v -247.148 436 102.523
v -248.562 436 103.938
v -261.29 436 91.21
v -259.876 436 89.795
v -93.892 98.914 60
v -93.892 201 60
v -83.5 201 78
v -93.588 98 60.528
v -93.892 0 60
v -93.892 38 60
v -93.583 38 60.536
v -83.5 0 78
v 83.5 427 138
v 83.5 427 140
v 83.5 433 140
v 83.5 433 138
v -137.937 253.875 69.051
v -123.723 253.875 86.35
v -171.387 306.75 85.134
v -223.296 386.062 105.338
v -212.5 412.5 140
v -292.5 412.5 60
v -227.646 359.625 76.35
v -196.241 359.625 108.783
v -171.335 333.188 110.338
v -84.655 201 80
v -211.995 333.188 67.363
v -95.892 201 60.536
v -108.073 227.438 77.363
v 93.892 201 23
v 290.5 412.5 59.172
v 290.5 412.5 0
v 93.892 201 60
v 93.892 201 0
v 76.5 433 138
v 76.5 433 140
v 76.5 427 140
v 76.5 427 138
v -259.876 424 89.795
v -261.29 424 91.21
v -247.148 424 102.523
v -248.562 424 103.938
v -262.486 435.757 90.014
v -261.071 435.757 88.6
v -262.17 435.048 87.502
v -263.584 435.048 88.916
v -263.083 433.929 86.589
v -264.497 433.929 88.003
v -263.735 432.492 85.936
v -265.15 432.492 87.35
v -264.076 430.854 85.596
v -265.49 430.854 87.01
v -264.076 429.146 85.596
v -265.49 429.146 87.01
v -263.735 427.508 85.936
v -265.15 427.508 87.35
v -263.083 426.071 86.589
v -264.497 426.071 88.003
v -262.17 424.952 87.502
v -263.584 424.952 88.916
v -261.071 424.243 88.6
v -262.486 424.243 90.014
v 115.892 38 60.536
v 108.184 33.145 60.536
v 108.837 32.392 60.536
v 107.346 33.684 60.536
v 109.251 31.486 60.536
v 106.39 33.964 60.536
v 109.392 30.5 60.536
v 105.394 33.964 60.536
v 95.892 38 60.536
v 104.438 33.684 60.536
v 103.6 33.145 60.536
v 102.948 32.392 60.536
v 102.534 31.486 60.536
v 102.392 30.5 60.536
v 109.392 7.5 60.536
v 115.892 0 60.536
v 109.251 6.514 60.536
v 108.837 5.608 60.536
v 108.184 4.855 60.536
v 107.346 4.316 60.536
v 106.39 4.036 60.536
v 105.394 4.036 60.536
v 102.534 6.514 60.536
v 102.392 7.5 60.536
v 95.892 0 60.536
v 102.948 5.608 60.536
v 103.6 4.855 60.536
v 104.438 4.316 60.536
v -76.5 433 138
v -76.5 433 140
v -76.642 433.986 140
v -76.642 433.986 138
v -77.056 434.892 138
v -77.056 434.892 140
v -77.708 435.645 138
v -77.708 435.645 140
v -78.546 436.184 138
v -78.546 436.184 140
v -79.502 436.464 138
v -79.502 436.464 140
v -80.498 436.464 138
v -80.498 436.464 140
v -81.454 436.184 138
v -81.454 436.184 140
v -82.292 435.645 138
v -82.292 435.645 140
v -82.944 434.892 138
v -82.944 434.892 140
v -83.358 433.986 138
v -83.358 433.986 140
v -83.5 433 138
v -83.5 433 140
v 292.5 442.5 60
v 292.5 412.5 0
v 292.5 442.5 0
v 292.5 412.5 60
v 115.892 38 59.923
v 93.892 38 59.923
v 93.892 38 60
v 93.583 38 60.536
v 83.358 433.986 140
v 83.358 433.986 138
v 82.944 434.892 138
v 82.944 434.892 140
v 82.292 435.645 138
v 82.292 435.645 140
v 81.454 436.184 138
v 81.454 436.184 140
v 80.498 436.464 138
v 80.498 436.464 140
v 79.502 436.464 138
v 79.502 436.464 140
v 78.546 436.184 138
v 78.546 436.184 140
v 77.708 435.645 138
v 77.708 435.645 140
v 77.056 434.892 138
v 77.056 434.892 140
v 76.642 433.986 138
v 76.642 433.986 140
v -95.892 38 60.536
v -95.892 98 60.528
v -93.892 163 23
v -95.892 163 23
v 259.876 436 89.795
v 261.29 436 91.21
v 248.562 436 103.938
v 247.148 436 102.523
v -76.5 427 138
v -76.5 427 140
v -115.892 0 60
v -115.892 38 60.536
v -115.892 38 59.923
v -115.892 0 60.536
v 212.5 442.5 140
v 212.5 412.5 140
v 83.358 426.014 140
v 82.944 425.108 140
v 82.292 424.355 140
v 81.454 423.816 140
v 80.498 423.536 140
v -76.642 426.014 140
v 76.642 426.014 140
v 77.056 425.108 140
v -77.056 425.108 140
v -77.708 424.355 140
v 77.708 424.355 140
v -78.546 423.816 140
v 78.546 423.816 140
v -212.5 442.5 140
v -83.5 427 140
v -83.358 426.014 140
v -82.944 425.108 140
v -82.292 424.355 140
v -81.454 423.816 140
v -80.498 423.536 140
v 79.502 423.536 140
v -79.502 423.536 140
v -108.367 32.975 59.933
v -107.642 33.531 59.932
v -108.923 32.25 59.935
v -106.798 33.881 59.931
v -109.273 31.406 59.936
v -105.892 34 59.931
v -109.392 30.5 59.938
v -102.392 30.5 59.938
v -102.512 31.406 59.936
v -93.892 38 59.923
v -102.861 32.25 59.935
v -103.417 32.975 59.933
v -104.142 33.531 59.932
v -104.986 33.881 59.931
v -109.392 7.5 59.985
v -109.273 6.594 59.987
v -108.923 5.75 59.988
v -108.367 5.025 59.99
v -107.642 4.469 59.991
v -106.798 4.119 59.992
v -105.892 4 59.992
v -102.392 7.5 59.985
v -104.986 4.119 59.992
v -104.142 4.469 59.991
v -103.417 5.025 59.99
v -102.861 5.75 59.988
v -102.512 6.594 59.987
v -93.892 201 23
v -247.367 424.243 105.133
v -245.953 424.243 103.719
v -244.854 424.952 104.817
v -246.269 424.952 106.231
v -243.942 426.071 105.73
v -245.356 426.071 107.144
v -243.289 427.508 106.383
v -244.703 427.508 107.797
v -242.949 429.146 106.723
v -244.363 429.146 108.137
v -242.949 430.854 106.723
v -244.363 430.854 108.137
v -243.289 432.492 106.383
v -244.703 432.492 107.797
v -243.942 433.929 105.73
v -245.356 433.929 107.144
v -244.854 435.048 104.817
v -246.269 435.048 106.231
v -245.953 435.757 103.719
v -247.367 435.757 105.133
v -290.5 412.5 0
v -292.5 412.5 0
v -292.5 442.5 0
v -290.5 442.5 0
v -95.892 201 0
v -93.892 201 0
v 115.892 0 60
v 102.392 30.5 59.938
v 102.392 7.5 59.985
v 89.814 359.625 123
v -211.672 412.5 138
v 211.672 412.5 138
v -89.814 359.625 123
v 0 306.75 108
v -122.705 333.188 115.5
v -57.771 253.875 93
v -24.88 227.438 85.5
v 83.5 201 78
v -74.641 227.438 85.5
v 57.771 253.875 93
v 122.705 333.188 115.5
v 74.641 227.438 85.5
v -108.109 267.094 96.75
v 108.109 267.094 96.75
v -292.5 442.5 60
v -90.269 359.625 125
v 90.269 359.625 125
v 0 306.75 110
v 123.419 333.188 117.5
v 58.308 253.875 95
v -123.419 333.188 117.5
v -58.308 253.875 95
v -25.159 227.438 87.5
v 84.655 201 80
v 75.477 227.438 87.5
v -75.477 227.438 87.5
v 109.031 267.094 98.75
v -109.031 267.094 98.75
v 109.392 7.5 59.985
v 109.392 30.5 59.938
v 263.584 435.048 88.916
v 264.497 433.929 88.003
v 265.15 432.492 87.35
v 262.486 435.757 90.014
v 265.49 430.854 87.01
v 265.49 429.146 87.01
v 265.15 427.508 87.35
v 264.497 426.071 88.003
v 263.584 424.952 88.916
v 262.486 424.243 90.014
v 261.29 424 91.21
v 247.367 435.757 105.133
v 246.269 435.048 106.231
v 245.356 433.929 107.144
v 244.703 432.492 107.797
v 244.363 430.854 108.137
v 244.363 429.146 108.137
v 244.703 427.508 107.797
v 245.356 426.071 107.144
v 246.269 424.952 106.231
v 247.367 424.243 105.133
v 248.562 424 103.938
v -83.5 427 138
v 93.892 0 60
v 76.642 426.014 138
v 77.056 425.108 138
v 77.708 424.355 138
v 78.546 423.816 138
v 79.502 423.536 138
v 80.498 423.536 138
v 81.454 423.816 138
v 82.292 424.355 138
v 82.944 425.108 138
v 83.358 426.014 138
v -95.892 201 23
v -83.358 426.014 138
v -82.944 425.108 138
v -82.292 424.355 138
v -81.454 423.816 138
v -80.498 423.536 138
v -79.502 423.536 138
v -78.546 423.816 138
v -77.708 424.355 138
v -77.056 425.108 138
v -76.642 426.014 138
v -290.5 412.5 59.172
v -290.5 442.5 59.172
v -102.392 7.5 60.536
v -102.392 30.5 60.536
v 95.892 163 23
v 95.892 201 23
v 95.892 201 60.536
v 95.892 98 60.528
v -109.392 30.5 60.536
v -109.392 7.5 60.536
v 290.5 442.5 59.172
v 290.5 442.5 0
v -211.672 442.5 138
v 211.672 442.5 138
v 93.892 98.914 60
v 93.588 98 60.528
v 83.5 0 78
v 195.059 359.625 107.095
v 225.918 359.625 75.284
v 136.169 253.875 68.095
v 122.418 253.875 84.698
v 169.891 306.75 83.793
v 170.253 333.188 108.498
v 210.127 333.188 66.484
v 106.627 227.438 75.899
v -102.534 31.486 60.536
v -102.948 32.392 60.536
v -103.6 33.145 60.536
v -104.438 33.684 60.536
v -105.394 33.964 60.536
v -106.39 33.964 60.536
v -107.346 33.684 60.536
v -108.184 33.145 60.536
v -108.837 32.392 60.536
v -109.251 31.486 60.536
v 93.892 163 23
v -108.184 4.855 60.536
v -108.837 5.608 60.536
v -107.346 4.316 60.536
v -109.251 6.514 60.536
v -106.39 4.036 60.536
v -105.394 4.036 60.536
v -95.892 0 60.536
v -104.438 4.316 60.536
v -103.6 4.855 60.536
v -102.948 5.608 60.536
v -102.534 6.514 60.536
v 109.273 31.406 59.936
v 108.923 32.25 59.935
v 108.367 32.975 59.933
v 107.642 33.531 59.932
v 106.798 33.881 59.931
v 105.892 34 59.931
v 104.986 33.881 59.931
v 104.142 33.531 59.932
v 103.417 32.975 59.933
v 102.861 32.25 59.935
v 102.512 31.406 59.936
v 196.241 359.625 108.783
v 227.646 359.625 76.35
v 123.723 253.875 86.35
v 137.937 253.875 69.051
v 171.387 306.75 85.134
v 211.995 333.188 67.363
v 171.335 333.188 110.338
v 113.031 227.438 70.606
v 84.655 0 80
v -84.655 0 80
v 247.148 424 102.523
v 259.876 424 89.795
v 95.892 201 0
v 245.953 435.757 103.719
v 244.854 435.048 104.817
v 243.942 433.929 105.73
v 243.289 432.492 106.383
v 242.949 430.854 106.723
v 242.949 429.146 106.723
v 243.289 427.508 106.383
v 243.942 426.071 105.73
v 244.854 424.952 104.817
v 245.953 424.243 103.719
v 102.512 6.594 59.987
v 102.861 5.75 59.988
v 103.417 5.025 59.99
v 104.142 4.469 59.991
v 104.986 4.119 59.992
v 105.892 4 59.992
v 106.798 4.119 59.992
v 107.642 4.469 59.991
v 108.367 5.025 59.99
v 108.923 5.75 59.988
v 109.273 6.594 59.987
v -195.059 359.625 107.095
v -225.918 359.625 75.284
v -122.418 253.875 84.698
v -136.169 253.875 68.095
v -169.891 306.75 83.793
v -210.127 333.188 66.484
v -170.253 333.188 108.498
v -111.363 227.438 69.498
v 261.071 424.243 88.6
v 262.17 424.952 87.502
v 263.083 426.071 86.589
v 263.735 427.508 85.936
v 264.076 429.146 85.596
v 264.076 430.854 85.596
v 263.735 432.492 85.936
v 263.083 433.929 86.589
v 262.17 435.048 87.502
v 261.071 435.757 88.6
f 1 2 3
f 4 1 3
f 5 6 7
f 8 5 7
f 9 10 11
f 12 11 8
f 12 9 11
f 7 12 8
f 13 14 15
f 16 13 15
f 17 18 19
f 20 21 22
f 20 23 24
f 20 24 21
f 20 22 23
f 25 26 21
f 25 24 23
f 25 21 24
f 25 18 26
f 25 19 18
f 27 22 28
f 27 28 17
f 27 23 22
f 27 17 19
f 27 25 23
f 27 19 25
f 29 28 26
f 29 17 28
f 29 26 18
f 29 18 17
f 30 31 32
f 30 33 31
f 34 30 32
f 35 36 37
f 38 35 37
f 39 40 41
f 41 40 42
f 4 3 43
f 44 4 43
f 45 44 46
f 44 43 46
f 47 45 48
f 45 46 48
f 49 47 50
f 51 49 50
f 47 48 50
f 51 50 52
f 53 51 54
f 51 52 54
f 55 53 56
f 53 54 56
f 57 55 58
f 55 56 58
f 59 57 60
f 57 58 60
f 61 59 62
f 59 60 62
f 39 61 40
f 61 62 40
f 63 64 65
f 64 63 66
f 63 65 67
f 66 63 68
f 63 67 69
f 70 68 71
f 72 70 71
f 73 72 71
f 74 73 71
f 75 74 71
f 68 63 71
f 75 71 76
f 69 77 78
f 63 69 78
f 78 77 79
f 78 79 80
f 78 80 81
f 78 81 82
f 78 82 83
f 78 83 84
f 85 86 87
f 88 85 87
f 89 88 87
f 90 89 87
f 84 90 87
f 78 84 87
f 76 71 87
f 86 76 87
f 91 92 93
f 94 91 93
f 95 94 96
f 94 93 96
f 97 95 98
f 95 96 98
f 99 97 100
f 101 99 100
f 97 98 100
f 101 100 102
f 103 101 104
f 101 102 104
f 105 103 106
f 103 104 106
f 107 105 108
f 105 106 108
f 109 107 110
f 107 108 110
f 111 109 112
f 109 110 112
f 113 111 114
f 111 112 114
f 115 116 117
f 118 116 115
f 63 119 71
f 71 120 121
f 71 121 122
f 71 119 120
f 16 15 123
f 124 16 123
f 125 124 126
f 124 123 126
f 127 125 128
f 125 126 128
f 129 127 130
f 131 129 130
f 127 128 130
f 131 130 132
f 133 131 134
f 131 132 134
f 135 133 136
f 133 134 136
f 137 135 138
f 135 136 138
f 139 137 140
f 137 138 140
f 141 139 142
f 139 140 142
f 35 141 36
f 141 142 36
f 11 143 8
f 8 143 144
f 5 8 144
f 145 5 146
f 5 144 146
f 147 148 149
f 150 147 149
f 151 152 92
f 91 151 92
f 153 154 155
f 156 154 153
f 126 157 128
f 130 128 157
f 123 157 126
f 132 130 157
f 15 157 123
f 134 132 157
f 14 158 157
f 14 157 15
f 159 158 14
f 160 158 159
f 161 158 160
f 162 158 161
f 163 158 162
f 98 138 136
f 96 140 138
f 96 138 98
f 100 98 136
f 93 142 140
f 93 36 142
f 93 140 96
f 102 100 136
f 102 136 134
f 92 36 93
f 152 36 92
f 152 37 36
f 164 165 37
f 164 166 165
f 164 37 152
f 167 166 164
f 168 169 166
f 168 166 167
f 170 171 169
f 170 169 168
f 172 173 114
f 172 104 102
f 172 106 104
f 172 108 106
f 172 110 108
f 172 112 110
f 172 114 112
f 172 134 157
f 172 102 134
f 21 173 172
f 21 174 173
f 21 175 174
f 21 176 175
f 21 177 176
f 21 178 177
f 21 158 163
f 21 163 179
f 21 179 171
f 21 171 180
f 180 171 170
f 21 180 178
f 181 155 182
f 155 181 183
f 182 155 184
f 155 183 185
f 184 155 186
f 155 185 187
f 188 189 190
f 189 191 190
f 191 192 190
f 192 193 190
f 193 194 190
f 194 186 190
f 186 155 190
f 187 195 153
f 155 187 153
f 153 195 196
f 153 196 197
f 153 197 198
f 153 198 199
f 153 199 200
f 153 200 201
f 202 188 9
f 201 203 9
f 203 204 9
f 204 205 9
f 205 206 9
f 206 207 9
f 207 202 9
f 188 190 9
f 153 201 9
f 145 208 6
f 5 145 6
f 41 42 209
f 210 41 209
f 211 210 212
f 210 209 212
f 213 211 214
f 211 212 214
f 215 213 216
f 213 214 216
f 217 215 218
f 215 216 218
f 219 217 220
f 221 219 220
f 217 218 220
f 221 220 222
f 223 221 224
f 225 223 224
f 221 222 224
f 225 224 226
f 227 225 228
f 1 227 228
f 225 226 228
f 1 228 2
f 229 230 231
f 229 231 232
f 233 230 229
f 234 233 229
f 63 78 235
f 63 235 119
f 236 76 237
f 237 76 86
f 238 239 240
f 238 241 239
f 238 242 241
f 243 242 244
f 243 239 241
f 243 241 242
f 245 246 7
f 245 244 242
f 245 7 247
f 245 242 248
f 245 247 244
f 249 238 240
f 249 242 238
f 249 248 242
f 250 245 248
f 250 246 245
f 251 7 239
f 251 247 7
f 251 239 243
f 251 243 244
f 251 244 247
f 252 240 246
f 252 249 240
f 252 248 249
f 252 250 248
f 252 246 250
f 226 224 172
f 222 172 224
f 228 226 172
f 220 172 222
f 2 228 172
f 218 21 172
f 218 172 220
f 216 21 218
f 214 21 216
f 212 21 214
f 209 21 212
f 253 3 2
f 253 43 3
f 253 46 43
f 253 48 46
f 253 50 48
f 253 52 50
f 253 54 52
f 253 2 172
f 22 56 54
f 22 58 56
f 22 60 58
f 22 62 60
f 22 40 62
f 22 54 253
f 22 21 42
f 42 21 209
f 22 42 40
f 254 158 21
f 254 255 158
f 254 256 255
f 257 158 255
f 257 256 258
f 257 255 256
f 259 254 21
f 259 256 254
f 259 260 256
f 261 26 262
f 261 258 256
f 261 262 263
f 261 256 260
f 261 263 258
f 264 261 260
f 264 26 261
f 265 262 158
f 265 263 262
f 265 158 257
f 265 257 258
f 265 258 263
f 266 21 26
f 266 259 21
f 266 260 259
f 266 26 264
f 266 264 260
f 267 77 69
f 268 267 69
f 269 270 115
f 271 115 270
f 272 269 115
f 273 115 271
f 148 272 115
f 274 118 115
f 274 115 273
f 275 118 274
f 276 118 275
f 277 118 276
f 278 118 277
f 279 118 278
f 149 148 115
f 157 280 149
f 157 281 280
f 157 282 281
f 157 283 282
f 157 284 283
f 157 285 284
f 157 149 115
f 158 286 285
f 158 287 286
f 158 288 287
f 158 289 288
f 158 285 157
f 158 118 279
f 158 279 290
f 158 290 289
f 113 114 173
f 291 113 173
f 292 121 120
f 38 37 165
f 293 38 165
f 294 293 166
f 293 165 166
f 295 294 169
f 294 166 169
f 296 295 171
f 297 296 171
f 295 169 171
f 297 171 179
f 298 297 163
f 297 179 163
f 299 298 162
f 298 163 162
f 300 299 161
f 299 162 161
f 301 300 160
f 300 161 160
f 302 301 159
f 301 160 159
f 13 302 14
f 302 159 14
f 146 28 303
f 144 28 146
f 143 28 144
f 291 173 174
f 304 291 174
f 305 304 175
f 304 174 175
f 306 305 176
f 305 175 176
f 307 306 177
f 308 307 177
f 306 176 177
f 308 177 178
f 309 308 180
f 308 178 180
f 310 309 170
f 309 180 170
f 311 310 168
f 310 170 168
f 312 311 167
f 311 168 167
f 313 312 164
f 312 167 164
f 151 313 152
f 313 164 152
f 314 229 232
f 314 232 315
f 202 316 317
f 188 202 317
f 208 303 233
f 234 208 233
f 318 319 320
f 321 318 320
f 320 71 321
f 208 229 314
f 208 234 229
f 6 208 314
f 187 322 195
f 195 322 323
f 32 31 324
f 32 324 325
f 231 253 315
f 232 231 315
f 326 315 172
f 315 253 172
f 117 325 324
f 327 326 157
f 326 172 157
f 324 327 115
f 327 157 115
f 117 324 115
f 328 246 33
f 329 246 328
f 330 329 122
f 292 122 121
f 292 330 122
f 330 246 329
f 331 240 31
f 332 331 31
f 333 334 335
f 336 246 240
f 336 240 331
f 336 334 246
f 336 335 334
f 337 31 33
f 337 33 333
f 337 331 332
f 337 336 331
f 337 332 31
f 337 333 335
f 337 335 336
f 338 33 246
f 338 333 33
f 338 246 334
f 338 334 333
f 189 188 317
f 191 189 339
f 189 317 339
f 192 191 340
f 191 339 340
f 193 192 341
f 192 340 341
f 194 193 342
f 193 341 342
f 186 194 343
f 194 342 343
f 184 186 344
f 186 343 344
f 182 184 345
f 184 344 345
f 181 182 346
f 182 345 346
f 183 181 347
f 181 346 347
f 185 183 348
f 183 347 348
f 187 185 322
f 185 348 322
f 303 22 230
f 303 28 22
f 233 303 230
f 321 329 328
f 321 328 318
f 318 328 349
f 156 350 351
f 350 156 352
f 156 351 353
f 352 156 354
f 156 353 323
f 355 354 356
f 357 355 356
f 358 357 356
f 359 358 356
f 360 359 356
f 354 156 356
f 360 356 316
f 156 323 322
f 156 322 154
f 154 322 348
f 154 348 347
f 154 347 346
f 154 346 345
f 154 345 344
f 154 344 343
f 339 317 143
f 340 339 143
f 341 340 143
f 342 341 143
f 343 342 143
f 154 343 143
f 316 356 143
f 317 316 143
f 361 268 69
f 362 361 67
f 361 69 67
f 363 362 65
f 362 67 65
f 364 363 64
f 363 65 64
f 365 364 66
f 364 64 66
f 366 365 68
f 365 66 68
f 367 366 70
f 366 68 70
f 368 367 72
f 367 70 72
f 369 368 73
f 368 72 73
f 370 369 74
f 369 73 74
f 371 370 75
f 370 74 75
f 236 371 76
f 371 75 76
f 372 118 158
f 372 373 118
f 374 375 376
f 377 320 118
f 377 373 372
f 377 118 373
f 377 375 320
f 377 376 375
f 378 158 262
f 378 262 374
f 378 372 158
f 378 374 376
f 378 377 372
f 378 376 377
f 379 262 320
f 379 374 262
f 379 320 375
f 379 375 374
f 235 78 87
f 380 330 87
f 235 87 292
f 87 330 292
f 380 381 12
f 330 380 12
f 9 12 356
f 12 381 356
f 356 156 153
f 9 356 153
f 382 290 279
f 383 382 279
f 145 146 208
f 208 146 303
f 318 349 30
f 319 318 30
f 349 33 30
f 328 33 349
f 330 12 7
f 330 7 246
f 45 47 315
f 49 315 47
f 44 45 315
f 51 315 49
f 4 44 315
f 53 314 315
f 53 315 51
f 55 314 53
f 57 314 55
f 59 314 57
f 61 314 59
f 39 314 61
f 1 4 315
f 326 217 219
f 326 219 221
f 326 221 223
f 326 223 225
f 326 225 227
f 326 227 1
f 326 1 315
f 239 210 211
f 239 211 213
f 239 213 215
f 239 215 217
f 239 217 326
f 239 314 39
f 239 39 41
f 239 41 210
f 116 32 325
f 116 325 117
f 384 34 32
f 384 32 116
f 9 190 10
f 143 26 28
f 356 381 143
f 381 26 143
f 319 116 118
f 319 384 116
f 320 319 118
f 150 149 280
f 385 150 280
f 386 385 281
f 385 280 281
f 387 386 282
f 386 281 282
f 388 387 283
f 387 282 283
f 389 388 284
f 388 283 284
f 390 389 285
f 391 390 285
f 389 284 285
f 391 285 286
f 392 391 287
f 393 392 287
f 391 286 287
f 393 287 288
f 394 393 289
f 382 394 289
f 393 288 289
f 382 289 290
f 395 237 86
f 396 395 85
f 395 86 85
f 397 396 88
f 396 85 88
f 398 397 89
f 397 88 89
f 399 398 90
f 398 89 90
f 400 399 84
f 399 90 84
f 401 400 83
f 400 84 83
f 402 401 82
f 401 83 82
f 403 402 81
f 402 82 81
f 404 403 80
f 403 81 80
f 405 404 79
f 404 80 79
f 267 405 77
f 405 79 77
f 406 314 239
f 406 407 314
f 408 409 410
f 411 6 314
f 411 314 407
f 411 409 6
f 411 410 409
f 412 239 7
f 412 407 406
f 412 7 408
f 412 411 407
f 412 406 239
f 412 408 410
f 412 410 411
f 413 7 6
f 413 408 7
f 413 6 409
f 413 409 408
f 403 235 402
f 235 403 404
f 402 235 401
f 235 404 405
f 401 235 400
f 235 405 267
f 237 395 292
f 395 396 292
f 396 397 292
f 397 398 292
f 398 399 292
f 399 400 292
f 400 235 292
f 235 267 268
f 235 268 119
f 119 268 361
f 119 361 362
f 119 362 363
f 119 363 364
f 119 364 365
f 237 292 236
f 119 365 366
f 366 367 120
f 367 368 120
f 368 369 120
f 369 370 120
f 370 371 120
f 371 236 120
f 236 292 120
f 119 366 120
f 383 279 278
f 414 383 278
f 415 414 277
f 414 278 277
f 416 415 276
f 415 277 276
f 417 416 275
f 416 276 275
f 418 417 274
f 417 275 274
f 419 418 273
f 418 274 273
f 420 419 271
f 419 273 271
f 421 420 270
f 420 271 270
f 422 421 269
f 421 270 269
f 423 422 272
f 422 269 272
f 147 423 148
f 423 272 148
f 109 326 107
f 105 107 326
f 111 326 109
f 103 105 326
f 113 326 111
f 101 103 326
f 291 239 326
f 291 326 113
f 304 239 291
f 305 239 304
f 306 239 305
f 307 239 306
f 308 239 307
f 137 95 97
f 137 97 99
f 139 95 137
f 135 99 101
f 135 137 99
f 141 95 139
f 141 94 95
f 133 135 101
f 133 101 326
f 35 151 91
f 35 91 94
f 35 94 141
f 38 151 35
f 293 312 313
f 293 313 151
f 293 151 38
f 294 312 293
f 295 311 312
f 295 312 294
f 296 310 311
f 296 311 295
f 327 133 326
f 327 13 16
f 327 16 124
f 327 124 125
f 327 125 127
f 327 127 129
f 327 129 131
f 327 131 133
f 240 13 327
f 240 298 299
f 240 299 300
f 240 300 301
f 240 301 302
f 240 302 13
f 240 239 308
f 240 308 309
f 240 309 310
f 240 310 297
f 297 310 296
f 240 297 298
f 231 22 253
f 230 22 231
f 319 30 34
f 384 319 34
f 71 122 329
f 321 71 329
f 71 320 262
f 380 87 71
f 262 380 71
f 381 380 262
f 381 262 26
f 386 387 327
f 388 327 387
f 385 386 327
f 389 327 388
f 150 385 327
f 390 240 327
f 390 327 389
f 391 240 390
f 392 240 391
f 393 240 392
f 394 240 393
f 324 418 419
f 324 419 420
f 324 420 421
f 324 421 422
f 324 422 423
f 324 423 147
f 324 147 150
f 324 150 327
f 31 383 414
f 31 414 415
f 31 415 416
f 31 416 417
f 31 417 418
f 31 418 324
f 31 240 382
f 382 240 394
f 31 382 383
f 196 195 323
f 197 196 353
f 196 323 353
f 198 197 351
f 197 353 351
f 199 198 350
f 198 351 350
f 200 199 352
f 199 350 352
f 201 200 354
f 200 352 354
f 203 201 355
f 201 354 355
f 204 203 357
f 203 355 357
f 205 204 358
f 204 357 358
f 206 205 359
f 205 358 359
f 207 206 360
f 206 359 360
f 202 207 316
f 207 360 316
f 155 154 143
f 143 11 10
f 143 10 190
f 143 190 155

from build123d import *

# Parameters (mm, degrees)
F1_DEPTH  = 201
F4_DEPTH  = 30
F7_DEPTH  = 388.393305
F9_DEPTH  = 20
F11_DEPTH = 20
F13_DEPTH = 60.536898
F15_DEPTH = 60.536898
F17_DEPTH = 140.001
F19_DEPTH = 456.084874
F21_DEPTH = 456.084874


with BuildPart() as f1:
    # F0 (on Front) → F1 (new body)
    with BuildSketch(Plane.XZ):
        Polygon((-83.5, 78), (0, 78), (83.5, 78), (93.892305, 60), (93.892305, 0), (95.892305, 0), (95.892305, 60.535898), (84.654701, 80), (0, 80), (-84.654701, 80), (-95.892305, 60.535898), (-95.892305, 0), (-93.892305, 0), (-93.892305, 60), align=None)
    extrude(amount=-F1_DEPTH)



with BuildPart() as f4:
    # F3 (on offset) → F4 (new body)
    with BuildSketch(Plane.XZ.offset(-412.5)):
        Polygon((212.5, 140), (0, 140), (-212.5, 140), (-292.5, 60), (-292.5, 0), (-290.5, 0), (-290.5, 59.171573), (-211.671573, 138), (0, 138), (211.671573, 138), (290.5, 59.171573), (290.5, 0), (292.5, 0), (292.5, 60), align=None)
    extrude(amount=-F4_DEPTH)


with BuildPart() as f1_1:
    add(f1.part)

    add(f4.part)  # F5 merges F4
    # F4_face (on face) → F5 section 0
    with BuildSketch(Plane(origin=(0, 412.5, 110.440506), x_dir=(1, 0, 0), z_dir=(0, -1, 0))):
        Polygon((211.671573, 27.559494), (290.5, -51.268933), (290.5, -110.440506), (292.5, -110.440506), (292.5, -50.440506), (212.5, 29.559494), (-212.5, 29.559494), (-292.5, -50.440506), (-292.5, -110.440506), (-290.5, -110.440506), (-290.5, -51.268933), (-211.671573, 27.559494), align=None)
    # F1_face (on face) → F5 section 1
    with BuildSketch(Plane(origin=(0, 201, 60.03778), x_dir=(1, 0, 0), z_dir=(0, 1, 0))):
        Polygon((-95.892305, 60.03778), (-95.892305, -0.498118), (-84.654701, -19.96222), (84.654701, -19.96222), (95.892305, -0.498118), (95.892305, 60.03778), (93.892305, 60.03778), (93.892305, 0.03778), (83.5, -17.96222), (-83.5, -17.96222), (-93.892305, 0.03778), (-93.892305, 60.03778), align=None)
    loft()

    # F6 (on face) → F7 (cut, through all)
    with BuildSketch(Plane(origin=(-95.892305, 0, 0), x_dir=(0, -1, 0), z_dir=(-1, 0, 0))):
        Polygon((-163, 23), (-201, 23), (-201, 0), (0, 0), (0, 60), (-38.000001, 59.923097), (-38.000001, 60.535898), (-98, 60.527767), align=None)
    extrude(amount=-F7_DEPTH, mode=Mode.SUBTRACT)

    # F8 (on face) → F9 (join)
    with BuildSketch(Plane(origin=(-95.892305, 0, 0), x_dir=(0, -1, 0), z_dir=(-1, 0, 0))):
        Polygon((0, 60.535898), (-38.000001, 60.535898), (-38.000001, 59.923097), (0, 60), align=None)
    extrude(amount=F9_DEPTH)

    # F10 (on face) → F11 (join)
    with BuildSketch(Plane.YZ.offset(95.892305)):
        Polygon((0, 60.535898), (0, 60), (38.000001, 59.923097), (38.000001, 60.535898), align=None)
    extrude(amount=F11_DEPTH)

    # F12 (on face) → F13 (cut, through all)
    with BuildSketch(Plane.XY.offset(60.535898)):
        with BuildLine():
            ThreePointArc((-102.392305, 30.5), (-105.892305, 34), (-109.392305, 30.5))
            Line((-109.392305, 30.5), (-109.392305, 7.5))
            ThreePointArc((-109.392305, 7.5), (-105.892305, 4), (-102.392305, 7.5))
            Line((-102.392305, 7.5), (-102.392305, 30.5))
        make_face()
    extrude(amount=-F13_DEPTH, mode=Mode.SUBTRACT)

    # F14 (on face) → F15 (cut, through all)
    with BuildSketch(Plane.XY.offset(60.535898)):
        with BuildLine():
            ThreePointArc((109.392305, 30.5), (105.892305, 34), (102.392305, 30.5))
            Line((102.392305, 30.5), (102.392305, 7.5))
            ThreePointArc((102.392305, 7.5), (105.892305, 4), (109.392305, 7.5))
            Line((109.392305, 7.5), (109.392305, 30.5))
        make_face()
    extrude(amount=-F15_DEPTH, mode=Mode.SUBTRACT)

    # F16 (on face) → F17 (cut, through all)
    with BuildSketch(Plane.XY.offset(140)):
        with BuildLine():
            Line((-76.5, 427), (-76.5, 433))
            ThreePointArc((-76.5, 433), (-80, 436.5), (-83.5, 433))
            Line((-83.5, 433), (-83.5, 427))
            ThreePointArc((-83.5, 427), (-80, 423.5), (-76.5, 427))
        make_face()
        with BuildLine():
            Line((83.5, 427), (83.5, 433))
            ThreePointArc((83.5, 433), (80, 436.5), (76.5, 433))
            Line((76.5, 433), (76.5, 427))
            ThreePointArc((76.5, 427), (80, 423.5), (83.5, 427))
        make_face()
    extrude(amount=-F17_DEPTH, mode=Mode.SUBTRACT)

    # F18 (on face) → F19 (cut, through all)
    with BuildSketch(Plane(origin=(-176.25, 0, 176.25), x_dir=(0.707107, 0, 0.707107), z_dir=(-0.707107, 0, 0.707107))):
        with BuildLine():
            Line((-102.265242, 436), (-120.265242, 436))
            ThreePointArc((-120.265242, 436), (-126.265242, 430), (-120.265242, 424))
            Line((-120.265242, 424), (-102.265242, 424))
            ThreePointArc((-102.265242, 424), (-96.265242, 430), (-102.265242, 436))
        make_face()
    extrude(amount=-F19_DEPTH, mode=Mode.SUBTRACT)

    # F20 (on face) → F21 (cut, through all)
    with BuildSketch(Plane(origin=(176.25, 0, 176.25), x_dir=(0.707107, 0, -0.707107), z_dir=(0.707107, 0, 0.707107))):
        with BuildLine():
            ThreePointArc((120.265242, 424), (126.265242, 430), (120.265242, 436))
            Line((120.265242, 436), (102.265242, 436))
            ThreePointArc((102.265242, 436), (96.265242, 430), (102.265242, 424))
            Line((102.265242, 424), (120.265242, 424))
        make_face()
    extrude(amount=-F21_DEPTH, mode=Mode.SUBTRACT)


solid = f1_1.part
